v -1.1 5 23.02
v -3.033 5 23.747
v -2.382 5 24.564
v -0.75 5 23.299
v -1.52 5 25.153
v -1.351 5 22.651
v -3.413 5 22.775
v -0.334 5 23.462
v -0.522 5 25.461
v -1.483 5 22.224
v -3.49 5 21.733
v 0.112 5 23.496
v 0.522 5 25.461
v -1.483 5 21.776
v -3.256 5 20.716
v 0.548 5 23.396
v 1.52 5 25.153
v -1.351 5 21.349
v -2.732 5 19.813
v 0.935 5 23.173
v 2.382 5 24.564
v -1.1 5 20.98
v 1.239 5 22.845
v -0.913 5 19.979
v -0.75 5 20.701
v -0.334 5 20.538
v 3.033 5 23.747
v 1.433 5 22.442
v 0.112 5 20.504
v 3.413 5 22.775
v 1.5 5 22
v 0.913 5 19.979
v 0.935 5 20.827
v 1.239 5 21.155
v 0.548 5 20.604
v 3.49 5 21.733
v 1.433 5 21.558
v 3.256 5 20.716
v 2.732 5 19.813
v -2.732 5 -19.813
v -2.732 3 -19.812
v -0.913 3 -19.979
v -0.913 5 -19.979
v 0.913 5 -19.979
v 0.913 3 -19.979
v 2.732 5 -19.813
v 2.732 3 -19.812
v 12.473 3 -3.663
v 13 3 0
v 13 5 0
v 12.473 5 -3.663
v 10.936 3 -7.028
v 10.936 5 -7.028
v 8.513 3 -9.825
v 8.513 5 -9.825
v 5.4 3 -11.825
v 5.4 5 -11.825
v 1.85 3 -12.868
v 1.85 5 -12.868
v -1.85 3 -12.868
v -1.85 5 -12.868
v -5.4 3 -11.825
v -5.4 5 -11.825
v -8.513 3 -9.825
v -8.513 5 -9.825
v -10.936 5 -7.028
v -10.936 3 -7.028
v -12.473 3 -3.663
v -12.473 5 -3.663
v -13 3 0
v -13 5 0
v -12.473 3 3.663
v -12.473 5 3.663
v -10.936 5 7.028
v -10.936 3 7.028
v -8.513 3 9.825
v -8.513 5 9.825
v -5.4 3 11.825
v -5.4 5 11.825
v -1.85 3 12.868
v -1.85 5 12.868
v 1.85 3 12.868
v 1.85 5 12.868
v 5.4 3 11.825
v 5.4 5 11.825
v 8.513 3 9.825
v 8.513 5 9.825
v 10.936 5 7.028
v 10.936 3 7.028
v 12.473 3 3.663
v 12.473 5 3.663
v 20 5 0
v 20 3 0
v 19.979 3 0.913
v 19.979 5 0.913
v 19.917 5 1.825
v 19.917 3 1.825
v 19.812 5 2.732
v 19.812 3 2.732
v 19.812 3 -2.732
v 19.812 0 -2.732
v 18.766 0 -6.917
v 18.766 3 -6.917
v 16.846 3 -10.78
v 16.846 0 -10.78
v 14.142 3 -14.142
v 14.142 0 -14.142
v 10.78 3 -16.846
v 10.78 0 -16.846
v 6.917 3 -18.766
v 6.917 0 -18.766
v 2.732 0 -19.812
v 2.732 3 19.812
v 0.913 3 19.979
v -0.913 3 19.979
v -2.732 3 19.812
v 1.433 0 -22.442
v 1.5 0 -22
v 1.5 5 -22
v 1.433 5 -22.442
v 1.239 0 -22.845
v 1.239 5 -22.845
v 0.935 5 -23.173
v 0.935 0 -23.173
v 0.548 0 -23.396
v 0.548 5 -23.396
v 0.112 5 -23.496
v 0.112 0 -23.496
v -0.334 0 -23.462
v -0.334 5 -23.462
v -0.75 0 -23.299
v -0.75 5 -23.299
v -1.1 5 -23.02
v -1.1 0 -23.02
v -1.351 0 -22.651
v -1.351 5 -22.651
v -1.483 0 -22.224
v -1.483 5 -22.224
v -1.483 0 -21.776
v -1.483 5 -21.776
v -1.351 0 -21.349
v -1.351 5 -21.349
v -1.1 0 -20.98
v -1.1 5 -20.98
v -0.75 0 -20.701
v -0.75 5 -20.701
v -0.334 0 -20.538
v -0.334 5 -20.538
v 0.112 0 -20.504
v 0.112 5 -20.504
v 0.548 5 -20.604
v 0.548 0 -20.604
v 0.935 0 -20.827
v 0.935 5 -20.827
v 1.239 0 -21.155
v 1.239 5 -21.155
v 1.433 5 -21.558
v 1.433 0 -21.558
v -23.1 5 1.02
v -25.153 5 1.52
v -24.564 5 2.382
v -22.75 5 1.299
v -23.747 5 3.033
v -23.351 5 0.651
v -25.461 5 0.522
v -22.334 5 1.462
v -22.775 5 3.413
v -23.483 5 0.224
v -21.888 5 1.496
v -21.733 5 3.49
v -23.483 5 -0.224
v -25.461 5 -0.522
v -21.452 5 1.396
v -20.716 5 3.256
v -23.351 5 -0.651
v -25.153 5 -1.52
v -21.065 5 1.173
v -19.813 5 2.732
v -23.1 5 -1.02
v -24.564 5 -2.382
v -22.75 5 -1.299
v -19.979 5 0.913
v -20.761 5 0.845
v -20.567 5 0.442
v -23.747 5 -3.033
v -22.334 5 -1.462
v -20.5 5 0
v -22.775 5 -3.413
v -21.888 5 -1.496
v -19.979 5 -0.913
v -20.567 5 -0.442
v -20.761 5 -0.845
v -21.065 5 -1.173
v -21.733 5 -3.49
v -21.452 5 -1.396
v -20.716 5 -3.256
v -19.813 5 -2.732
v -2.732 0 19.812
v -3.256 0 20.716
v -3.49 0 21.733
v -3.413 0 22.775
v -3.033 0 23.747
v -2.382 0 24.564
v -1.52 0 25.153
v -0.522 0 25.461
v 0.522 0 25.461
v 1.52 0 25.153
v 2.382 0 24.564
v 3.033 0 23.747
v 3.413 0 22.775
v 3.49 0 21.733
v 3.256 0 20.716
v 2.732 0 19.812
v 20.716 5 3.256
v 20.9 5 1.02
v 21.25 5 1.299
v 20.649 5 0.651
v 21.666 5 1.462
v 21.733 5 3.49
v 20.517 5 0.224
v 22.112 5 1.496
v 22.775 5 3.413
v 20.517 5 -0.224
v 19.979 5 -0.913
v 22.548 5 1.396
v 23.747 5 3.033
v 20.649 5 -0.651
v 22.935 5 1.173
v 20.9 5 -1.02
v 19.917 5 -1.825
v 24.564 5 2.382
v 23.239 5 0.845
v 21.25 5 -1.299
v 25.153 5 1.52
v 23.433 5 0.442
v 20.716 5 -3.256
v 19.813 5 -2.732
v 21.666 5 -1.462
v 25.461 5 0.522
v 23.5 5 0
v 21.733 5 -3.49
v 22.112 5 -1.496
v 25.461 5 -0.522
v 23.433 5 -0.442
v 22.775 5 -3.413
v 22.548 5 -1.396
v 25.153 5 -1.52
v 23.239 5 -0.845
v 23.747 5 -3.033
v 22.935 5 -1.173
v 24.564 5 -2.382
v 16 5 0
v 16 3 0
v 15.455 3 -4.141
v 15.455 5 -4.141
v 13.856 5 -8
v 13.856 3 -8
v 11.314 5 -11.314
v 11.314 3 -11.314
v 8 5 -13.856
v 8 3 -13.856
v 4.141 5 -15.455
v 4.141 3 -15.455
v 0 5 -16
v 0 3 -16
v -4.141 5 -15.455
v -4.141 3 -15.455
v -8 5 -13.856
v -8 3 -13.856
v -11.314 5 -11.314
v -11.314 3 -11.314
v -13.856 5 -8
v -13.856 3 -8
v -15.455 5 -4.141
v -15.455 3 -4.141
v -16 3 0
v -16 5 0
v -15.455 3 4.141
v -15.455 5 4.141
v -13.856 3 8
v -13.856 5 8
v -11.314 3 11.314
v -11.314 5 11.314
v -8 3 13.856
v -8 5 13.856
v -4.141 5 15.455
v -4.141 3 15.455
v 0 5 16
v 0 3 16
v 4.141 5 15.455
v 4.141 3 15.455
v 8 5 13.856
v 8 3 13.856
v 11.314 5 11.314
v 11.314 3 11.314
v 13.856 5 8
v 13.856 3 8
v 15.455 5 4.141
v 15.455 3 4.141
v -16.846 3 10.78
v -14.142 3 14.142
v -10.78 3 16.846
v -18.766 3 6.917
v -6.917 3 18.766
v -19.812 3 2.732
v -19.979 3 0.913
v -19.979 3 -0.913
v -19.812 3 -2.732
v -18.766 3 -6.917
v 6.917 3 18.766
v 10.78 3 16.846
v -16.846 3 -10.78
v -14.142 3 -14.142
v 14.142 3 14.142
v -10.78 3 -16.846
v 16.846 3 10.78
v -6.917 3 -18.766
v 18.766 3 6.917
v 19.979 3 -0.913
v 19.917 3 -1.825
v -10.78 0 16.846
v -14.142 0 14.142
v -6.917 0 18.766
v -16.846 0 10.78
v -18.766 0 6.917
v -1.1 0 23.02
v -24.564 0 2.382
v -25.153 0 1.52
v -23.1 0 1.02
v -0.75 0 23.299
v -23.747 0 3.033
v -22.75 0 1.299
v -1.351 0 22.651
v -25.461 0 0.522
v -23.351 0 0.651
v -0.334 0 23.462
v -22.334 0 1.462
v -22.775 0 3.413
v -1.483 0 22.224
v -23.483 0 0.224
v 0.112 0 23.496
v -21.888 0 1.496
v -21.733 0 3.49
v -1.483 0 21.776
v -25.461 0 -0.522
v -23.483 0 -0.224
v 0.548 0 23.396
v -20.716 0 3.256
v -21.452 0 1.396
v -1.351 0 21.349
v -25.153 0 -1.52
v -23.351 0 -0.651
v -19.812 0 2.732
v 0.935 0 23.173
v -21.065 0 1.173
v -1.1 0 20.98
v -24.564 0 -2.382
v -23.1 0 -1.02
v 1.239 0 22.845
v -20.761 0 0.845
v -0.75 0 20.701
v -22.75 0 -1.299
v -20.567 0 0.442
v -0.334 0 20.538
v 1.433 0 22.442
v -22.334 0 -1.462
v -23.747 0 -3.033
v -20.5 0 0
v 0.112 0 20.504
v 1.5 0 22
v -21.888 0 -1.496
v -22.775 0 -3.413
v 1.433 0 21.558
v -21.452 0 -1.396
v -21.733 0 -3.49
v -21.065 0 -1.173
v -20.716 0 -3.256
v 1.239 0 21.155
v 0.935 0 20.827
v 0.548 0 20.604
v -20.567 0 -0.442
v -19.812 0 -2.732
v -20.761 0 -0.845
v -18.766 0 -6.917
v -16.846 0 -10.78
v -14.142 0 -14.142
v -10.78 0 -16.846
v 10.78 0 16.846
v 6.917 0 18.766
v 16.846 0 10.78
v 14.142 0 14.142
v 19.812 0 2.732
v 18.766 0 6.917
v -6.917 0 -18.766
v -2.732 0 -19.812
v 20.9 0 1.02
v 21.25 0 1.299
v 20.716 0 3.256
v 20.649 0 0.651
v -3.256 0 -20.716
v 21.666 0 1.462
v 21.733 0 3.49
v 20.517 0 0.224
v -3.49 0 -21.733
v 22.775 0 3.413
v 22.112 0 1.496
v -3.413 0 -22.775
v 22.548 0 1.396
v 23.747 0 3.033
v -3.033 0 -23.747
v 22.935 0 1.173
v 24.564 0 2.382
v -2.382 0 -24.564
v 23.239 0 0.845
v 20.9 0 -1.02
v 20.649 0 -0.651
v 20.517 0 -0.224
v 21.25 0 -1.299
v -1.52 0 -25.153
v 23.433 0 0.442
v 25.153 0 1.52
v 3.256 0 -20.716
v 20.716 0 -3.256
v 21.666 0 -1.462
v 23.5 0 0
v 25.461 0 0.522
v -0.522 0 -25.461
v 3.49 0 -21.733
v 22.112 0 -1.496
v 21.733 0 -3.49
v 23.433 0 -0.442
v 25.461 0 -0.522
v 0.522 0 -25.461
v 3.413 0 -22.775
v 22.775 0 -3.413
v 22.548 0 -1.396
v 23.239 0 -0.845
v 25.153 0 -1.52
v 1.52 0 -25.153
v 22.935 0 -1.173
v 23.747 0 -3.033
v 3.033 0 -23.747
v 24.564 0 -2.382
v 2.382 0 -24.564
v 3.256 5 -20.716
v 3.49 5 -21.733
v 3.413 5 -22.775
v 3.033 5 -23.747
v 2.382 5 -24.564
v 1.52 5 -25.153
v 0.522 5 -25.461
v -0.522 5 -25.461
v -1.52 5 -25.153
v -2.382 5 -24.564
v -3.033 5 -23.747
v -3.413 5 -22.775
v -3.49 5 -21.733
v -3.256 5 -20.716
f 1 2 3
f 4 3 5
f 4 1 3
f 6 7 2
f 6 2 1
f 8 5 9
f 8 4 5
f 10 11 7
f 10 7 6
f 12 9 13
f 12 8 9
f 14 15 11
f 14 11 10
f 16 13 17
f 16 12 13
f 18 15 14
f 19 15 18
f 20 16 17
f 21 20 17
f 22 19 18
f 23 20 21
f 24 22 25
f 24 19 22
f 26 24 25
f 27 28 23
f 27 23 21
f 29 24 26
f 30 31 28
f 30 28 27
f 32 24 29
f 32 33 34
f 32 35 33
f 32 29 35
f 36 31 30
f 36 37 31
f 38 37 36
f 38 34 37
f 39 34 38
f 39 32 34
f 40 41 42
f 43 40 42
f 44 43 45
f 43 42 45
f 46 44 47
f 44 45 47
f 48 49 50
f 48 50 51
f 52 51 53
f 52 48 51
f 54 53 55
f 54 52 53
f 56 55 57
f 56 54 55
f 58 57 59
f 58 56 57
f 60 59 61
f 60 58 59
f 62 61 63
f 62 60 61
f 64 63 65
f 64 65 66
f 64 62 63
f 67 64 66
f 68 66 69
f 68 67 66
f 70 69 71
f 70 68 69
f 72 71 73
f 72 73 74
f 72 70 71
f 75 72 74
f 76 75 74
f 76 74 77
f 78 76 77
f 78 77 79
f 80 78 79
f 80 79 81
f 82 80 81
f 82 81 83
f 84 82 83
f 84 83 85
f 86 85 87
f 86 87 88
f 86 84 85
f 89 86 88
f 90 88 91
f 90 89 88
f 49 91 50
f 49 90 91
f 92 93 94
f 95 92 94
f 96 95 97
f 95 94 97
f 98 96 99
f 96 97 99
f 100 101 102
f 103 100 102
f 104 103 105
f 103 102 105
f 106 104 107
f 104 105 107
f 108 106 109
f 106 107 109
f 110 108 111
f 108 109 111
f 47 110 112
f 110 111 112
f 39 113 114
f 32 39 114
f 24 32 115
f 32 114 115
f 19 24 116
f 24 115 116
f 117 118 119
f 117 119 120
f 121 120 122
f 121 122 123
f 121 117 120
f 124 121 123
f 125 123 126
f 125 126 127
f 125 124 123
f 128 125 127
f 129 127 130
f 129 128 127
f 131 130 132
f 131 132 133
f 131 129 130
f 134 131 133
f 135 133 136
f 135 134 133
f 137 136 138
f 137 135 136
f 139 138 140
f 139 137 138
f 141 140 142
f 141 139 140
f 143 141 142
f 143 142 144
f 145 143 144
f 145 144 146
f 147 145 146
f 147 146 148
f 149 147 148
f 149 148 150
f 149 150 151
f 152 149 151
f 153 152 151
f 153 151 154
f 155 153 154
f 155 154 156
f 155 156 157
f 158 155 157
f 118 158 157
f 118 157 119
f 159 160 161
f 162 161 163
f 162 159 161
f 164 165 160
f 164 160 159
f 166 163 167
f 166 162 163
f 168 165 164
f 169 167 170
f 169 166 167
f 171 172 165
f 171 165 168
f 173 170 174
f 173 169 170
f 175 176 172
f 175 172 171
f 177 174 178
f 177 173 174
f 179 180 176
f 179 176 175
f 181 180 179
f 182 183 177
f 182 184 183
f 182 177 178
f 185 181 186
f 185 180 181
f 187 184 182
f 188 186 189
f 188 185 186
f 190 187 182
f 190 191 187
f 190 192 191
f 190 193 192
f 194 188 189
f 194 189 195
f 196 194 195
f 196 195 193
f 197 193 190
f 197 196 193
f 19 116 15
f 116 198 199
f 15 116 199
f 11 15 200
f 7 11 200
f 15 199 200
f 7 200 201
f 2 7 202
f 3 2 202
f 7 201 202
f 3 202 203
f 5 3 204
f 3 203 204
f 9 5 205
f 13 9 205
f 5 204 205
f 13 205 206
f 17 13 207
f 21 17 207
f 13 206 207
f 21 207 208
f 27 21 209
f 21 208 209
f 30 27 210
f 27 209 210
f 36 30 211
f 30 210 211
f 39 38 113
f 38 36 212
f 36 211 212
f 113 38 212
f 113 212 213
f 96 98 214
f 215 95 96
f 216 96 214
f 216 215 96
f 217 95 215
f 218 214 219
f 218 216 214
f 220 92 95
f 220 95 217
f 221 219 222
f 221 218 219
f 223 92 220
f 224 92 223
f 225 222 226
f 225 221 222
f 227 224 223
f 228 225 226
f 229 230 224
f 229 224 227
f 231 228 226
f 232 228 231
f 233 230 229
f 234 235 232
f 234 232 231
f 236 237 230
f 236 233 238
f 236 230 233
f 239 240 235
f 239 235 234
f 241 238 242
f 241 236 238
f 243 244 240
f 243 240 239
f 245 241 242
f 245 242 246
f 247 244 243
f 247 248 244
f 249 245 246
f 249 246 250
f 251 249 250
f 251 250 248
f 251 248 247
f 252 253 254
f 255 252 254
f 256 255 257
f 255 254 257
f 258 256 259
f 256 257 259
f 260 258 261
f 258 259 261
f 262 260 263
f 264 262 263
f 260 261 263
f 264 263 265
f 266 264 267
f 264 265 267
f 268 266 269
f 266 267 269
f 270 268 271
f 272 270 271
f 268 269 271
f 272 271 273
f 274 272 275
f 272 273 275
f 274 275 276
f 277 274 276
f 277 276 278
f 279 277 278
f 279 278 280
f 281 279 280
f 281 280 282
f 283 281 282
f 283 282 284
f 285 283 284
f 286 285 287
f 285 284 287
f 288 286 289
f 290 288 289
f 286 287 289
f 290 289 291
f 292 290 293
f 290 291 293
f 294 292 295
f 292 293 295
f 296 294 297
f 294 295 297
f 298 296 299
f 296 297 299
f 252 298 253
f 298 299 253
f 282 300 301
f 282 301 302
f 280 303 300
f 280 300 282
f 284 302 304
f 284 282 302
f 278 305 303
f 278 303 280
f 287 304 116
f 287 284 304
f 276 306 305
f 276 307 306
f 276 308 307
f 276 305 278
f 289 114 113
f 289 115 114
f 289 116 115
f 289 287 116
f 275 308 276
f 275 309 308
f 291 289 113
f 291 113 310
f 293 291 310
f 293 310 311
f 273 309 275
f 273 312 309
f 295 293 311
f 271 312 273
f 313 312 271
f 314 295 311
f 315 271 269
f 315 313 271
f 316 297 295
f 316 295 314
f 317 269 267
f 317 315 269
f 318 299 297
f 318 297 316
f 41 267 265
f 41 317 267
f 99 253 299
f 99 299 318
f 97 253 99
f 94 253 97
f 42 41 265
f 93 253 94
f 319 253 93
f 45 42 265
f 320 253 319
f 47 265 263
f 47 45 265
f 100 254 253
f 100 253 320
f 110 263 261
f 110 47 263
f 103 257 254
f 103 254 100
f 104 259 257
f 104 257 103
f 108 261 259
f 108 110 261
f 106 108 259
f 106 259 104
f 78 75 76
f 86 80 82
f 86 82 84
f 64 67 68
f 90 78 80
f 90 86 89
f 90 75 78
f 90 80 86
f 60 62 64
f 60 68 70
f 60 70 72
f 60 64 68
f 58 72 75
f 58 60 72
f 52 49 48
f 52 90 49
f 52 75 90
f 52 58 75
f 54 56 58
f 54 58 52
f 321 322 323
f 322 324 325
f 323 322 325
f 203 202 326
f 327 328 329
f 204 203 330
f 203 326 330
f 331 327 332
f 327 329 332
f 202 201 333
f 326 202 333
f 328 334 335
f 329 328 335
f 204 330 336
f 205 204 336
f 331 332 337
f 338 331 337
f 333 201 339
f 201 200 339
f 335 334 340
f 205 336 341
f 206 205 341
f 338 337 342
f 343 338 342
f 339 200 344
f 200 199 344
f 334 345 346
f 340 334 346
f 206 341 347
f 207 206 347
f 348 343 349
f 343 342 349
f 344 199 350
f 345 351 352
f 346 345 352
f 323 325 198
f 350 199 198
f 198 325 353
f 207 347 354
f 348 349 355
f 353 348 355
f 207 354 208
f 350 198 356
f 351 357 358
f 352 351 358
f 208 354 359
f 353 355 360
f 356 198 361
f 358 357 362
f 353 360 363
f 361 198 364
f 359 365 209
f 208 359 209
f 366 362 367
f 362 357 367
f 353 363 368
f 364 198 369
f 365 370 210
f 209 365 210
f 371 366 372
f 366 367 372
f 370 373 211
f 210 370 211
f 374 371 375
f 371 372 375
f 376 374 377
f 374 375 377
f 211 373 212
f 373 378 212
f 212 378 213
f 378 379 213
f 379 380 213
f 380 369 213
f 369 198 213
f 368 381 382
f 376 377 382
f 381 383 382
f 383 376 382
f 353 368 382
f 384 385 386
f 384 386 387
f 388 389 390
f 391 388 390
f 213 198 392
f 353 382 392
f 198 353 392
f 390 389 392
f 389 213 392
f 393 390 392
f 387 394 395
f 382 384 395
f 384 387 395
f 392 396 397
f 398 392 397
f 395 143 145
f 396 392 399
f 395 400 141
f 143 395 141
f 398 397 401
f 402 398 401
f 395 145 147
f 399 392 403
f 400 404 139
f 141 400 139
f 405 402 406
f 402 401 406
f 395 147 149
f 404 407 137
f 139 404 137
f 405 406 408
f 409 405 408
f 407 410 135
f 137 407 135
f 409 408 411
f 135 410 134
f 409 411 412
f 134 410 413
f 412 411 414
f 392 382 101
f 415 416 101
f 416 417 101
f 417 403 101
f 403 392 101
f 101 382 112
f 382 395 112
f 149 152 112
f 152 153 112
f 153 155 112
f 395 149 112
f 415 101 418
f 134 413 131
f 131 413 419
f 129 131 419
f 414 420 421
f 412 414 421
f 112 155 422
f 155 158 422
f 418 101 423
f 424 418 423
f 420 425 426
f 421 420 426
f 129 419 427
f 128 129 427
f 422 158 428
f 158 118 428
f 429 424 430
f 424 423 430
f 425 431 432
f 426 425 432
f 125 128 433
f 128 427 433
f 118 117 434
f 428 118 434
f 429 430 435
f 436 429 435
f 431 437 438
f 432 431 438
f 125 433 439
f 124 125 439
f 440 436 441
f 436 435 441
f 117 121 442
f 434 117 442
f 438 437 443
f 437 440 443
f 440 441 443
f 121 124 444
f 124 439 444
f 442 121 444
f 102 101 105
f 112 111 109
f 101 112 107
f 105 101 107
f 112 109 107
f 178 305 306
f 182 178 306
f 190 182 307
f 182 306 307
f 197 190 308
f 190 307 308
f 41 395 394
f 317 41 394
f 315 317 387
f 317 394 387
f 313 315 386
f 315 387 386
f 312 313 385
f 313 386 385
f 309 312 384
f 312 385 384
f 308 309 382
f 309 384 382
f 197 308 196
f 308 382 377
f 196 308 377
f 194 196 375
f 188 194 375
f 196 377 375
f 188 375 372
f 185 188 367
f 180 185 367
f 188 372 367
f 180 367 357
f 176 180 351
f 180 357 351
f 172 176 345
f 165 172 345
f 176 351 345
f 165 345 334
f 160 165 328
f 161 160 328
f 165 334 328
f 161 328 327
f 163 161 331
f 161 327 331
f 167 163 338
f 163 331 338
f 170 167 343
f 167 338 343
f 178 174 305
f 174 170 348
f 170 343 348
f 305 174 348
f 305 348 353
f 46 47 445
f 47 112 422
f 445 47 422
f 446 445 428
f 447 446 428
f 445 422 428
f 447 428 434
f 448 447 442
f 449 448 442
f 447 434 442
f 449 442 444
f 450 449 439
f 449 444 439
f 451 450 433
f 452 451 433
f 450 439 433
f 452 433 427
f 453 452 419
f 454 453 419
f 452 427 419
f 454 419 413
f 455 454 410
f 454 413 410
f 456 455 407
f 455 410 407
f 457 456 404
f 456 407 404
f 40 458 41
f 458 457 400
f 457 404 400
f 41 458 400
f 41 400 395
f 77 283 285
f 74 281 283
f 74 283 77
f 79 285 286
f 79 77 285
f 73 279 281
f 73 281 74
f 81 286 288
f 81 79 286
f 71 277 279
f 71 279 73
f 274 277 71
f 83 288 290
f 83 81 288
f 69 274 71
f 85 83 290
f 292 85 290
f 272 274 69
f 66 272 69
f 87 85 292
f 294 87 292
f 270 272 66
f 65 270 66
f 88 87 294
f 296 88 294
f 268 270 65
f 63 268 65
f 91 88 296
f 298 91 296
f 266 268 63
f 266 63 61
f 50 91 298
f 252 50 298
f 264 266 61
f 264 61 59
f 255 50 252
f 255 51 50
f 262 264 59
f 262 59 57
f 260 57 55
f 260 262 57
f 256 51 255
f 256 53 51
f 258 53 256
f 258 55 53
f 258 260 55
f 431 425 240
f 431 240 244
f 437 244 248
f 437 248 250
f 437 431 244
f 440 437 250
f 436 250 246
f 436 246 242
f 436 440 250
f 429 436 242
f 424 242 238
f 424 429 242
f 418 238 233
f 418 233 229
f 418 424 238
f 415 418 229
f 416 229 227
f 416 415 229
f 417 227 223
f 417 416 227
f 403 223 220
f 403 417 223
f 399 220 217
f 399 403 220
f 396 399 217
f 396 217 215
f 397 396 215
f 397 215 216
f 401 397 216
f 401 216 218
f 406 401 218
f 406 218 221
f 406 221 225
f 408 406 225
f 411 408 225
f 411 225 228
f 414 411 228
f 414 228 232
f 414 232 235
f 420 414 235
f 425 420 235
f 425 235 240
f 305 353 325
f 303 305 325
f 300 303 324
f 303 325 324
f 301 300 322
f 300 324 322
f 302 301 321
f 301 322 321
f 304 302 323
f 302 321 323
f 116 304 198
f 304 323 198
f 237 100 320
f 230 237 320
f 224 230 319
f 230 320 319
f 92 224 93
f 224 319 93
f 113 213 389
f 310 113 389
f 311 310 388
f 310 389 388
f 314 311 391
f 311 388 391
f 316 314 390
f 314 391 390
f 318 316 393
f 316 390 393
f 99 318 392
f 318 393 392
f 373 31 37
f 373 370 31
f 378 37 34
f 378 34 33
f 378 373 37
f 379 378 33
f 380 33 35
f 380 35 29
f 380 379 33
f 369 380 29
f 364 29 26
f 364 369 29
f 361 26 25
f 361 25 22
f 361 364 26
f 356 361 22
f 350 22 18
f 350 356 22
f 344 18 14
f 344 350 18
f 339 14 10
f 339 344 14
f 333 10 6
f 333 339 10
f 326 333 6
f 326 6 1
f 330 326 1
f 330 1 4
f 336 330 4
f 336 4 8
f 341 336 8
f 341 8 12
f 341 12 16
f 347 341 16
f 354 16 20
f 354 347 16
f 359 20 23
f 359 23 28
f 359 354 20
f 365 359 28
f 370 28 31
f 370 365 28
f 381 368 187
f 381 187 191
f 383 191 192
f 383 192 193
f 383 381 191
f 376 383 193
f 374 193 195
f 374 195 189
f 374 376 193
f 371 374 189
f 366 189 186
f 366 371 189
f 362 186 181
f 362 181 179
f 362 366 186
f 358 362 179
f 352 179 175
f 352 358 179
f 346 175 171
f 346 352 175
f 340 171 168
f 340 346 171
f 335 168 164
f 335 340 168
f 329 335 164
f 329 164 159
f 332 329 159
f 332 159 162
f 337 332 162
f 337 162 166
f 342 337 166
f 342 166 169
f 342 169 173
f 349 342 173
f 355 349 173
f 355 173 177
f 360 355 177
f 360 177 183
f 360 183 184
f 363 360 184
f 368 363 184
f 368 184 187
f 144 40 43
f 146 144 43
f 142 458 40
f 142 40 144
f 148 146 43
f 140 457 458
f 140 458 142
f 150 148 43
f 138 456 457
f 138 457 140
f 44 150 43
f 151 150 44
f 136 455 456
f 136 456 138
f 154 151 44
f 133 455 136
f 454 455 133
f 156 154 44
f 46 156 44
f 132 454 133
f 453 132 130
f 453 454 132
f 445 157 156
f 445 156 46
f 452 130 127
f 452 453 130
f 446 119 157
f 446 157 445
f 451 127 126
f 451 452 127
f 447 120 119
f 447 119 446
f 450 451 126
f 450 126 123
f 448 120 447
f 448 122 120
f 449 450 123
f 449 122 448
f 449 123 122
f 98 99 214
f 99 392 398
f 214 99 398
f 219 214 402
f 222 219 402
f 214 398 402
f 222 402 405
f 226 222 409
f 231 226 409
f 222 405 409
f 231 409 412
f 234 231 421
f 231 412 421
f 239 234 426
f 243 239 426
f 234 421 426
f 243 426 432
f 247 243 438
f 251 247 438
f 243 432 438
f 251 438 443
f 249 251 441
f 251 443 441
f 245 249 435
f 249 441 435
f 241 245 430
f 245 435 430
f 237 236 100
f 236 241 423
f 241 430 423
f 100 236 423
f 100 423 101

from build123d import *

# Parameters (mm, degrees)
SKETCH1_R           = 1.5
BOSS_EXTRUDE1_DEPTH = 3
BOSS_EXTRUDE2_START = 3
SKETCH1_4_R         = 1.5
SKETCH1_4_R_2       = 16
SKETCH1_4_R_3       = 13
BOSS_EXTRUDE2_DEPTH = 2


with BuildPart() as part:
    # Sketch1 → Boss-Extrude1 (new body)
    with BuildSketch(Plane(origin=(0, 0, 0), x_dir=(1, 0, 0), z_dir=(0, 1, 0))):
        with BuildLine():
            ThreePointArc((19.8125, 2.732186624), (14.142135624, 14.142135624), (2.732186624, 19.8125))
            ThreePointArc((2.732186624, 19.8125), (0, 25.5), (-2.732186624, 19.8125))
            ThreePointArc((-2.732186624, 19.8125), (-14.142135624, 14.142135624), (-19.8125, 2.732186624))
            ThreePointArc((-19.8125, 2.732186624), (-25.5, 0), (-19.8125, -2.732186624))
            ThreePointArc((-19.8125, -2.732186624), (-14.142135624, -14.142135624), (-2.732186624, -19.8125))
            ThreePointArc((-2.732186624, -19.8125), (0, -25.5), (2.732186624, -19.8125))
            ThreePointArc((2.732186624, -19.8125), (14.142135624, -14.142135624), (19.8125, -2.732186624))
            ThreePointArc((19.8125, -2.732186624), (25.5, 0), (19.8125, 2.732186624))
        make_face()
        with Locations((22, 0)):
            Circle(SKETCH1_R, mode=Mode.SUBTRACT)
        with Locations((0, 22)):
            Circle(SKETCH1_R, mode=Mode.SUBTRACT)
        with Locations((0, -22)):
            Circle(SKETCH1_R, mode=Mode.SUBTRACT)
        with Locations((-22, 0)):
            Circle(SKETCH1_R, mode=Mode.SUBTRACT)
    extrude(amount=BOSS_EXTRUDE1_DEPTH)

    # Sketch1_4 → Boss-Extrude2 (add)
    with BuildSketch(Plane(origin=(0, 0, 0), x_dir=(1, 0, 0), z_dir=(0, 1, 0)).offset(BOSS_EXTRUDE2_START)):
        with BuildLine():
            ThreePointArc((-2.732186624, -19.8125), (0, -25.5), (2.732186624, -19.8125))
            ThreePointArc((2.732186624, -19.8125), (0, -20), (-2.732186624, -19.8125))
        make_face()
        with Locations((0, -22)):
            Circle(SKETCH1_4_R, mode=Mode.SUBTRACT)
        with BuildLine():
            ThreePointArc((19.8125, 2.732186624), (19.953069939, 1.369306394), (20, 0))
            ThreePointArc((20, 0), (19.953069939, -1.369306394), (19.8125, -2.732186624))
            ThreePointArc((19.8125, -2.732186624), (25.5, 0), (19.8125, 2.732186624))
        make_face()
        with Locations((22, 0)):
            Circle(SKETCH1_4_R, mode=Mode.SUBTRACT)
        with BuildLine():
            ThreePointArc((-2.732186624, 19.8125), (0, 20), (2.732186624, 19.8125))
            ThreePointArc((2.732186624, 19.8125), (0, 25.5), (-2.732186624, 19.8125))
        make_face()
        with Locations((0, 22)):
            Circle(SKETCH1_4_R, mode=Mode.SUBTRACT)
        with BuildLine():
            ThreePointArc((-19.8125, -2.732186624), (-20, 0), (-19.8125, 2.732186624))
            ThreePointArc((-19.8125, 2.732186624), (-25.5, 0), (-19.8125, -2.732186624))
        make_face()
        with Locations((-22, 0)):
            Circle(SKETCH1_4_R, mode=Mode.SUBTRACT)
        Circle(SKETCH1_4_R_2)
        Circle(SKETCH1_4_R_3, mode=Mode.SUBTRACT)
    extrude(amount=BOSS_EXTRUDE2_DEPTH)


solid = part.part
